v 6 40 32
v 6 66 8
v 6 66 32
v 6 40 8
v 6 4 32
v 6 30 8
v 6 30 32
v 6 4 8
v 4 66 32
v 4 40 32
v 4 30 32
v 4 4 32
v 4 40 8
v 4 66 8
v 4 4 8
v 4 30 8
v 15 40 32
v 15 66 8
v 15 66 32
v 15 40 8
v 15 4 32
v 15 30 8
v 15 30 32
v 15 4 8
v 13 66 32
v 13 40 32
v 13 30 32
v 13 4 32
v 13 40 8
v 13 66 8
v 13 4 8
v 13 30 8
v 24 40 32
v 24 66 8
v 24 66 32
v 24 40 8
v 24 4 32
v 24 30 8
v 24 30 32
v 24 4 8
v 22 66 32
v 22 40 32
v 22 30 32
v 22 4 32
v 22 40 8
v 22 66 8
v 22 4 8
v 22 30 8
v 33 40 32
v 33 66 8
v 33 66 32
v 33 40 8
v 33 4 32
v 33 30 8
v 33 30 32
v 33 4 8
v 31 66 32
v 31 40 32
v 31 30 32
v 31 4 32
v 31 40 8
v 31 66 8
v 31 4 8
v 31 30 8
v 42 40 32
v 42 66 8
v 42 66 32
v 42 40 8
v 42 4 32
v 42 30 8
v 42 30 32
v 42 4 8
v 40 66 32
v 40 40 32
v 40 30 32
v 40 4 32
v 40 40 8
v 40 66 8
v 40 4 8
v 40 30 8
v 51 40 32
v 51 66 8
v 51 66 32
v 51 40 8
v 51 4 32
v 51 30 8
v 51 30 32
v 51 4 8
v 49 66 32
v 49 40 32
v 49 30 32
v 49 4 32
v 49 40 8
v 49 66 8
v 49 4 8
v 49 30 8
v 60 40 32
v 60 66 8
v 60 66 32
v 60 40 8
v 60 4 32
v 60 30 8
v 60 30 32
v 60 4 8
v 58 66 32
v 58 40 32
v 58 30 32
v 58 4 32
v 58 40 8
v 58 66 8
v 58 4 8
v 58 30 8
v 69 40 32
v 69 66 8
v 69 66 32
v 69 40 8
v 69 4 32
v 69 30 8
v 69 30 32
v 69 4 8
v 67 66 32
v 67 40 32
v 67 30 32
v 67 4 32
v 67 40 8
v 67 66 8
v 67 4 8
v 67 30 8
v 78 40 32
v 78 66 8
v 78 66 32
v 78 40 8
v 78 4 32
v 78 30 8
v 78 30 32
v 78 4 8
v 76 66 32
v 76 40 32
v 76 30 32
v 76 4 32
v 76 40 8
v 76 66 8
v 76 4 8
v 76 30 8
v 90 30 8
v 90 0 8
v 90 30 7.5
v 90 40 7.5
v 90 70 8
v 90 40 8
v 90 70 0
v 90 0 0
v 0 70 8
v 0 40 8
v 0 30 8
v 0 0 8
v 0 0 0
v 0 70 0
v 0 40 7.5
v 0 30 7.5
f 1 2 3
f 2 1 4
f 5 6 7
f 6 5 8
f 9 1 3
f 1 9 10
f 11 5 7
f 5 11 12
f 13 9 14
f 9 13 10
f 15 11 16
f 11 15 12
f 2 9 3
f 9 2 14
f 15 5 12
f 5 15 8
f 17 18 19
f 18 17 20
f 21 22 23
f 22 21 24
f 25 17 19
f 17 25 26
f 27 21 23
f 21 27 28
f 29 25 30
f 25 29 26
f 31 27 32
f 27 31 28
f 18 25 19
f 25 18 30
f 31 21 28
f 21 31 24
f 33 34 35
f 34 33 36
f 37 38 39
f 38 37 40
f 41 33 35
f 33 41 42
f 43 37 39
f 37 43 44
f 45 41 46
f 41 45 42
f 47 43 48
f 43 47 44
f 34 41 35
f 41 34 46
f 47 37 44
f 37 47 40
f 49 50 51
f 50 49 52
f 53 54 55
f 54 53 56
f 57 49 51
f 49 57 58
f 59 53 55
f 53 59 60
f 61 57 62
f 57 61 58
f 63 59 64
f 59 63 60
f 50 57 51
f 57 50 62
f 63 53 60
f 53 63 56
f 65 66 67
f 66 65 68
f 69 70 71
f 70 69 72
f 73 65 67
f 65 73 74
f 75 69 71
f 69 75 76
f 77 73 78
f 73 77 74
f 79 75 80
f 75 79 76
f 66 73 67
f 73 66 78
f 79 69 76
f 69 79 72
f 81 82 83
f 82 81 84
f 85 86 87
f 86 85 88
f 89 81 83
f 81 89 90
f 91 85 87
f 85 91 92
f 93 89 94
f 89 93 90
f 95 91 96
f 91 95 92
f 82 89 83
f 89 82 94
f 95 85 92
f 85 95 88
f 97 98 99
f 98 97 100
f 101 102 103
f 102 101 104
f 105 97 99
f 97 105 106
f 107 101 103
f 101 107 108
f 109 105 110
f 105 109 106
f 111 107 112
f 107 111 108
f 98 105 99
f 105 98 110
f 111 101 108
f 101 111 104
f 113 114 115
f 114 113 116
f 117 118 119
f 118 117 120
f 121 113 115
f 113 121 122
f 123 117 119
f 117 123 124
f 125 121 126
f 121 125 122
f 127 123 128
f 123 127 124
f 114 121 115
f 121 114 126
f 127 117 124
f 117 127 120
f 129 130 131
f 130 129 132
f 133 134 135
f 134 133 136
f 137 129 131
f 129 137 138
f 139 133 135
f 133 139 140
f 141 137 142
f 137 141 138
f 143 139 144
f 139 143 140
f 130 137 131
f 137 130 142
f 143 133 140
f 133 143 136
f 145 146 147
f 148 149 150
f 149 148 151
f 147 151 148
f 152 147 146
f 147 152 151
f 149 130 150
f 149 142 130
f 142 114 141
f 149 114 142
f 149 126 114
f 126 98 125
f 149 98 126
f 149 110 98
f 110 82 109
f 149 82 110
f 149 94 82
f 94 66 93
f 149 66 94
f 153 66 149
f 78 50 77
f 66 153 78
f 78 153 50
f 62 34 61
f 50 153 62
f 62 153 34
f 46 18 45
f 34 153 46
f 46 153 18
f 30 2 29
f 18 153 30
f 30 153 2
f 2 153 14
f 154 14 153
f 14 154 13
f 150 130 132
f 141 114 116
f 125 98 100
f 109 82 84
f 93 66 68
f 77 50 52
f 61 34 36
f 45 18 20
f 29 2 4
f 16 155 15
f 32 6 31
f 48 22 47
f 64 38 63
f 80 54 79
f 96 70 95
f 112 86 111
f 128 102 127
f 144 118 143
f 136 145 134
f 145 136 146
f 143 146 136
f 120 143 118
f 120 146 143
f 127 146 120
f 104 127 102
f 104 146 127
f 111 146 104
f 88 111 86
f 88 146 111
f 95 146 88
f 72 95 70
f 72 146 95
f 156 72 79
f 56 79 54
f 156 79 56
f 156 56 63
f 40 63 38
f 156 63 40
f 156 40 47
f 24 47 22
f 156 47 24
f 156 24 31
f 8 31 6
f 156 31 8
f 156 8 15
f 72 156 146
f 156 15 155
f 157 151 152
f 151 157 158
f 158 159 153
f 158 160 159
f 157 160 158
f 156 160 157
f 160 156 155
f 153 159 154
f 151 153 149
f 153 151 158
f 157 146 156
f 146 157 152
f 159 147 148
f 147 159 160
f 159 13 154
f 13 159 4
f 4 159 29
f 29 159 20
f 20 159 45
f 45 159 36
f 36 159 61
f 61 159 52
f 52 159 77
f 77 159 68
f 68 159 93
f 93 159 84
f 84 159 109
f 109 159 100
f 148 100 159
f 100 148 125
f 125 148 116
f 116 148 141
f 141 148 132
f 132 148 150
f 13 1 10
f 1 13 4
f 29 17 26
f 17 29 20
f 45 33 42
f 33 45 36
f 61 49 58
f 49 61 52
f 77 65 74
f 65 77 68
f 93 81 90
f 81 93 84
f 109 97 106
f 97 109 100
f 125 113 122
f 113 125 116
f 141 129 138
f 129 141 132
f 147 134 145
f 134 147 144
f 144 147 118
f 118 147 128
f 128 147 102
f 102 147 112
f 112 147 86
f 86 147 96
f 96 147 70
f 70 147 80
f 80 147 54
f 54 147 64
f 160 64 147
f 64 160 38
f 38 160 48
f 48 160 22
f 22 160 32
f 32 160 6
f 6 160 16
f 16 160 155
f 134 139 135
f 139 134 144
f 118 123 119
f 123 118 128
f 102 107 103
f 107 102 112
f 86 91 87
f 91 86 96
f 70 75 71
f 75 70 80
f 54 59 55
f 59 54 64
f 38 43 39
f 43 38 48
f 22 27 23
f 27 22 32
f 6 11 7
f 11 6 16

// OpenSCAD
$fn = 32;

// ----------------------------------------------------------------------
// Heatsink: slotted fin block
// ----------------------------------------------------------------------

// --- parameters (mm) ---
base_l = 90;              // base length, X
base_w = 70;              // base width, Y
base_t = 8;               // base plate thickness
fin_h = 25;               // fin height above the base
fin_t = 2;                // fin thickness
edge = 4;                 // margin from the base ends
pitch = 9;                // fin pitch
slot_w = 10;              // central slot width, Y
fit_tol = 0.05;           // tolerance for press fits, mm
free_tol = 0.3;           // tolerance for clearance fits, mm

n_fins = floor((base_l - 2 * edge - fin_t) / pitch) + 1;  // fin count
total_h = base_t + fin_h - 1;  // overall height

difference() {
union() {
  cube([base_l, base_w, base_t]);
  for (i = [0 : n_fins - 1])
    translate([edge + i * pitch, edge, base_t - 1])
      cube([fin_t, base_w - 2 * edge, fin_h]);
}
  translate([-1, base_w / 2 - slot_w / 2, base_t - 0.5])
    cube([base_l + 2, slot_w, fin_h + 2]);
}
